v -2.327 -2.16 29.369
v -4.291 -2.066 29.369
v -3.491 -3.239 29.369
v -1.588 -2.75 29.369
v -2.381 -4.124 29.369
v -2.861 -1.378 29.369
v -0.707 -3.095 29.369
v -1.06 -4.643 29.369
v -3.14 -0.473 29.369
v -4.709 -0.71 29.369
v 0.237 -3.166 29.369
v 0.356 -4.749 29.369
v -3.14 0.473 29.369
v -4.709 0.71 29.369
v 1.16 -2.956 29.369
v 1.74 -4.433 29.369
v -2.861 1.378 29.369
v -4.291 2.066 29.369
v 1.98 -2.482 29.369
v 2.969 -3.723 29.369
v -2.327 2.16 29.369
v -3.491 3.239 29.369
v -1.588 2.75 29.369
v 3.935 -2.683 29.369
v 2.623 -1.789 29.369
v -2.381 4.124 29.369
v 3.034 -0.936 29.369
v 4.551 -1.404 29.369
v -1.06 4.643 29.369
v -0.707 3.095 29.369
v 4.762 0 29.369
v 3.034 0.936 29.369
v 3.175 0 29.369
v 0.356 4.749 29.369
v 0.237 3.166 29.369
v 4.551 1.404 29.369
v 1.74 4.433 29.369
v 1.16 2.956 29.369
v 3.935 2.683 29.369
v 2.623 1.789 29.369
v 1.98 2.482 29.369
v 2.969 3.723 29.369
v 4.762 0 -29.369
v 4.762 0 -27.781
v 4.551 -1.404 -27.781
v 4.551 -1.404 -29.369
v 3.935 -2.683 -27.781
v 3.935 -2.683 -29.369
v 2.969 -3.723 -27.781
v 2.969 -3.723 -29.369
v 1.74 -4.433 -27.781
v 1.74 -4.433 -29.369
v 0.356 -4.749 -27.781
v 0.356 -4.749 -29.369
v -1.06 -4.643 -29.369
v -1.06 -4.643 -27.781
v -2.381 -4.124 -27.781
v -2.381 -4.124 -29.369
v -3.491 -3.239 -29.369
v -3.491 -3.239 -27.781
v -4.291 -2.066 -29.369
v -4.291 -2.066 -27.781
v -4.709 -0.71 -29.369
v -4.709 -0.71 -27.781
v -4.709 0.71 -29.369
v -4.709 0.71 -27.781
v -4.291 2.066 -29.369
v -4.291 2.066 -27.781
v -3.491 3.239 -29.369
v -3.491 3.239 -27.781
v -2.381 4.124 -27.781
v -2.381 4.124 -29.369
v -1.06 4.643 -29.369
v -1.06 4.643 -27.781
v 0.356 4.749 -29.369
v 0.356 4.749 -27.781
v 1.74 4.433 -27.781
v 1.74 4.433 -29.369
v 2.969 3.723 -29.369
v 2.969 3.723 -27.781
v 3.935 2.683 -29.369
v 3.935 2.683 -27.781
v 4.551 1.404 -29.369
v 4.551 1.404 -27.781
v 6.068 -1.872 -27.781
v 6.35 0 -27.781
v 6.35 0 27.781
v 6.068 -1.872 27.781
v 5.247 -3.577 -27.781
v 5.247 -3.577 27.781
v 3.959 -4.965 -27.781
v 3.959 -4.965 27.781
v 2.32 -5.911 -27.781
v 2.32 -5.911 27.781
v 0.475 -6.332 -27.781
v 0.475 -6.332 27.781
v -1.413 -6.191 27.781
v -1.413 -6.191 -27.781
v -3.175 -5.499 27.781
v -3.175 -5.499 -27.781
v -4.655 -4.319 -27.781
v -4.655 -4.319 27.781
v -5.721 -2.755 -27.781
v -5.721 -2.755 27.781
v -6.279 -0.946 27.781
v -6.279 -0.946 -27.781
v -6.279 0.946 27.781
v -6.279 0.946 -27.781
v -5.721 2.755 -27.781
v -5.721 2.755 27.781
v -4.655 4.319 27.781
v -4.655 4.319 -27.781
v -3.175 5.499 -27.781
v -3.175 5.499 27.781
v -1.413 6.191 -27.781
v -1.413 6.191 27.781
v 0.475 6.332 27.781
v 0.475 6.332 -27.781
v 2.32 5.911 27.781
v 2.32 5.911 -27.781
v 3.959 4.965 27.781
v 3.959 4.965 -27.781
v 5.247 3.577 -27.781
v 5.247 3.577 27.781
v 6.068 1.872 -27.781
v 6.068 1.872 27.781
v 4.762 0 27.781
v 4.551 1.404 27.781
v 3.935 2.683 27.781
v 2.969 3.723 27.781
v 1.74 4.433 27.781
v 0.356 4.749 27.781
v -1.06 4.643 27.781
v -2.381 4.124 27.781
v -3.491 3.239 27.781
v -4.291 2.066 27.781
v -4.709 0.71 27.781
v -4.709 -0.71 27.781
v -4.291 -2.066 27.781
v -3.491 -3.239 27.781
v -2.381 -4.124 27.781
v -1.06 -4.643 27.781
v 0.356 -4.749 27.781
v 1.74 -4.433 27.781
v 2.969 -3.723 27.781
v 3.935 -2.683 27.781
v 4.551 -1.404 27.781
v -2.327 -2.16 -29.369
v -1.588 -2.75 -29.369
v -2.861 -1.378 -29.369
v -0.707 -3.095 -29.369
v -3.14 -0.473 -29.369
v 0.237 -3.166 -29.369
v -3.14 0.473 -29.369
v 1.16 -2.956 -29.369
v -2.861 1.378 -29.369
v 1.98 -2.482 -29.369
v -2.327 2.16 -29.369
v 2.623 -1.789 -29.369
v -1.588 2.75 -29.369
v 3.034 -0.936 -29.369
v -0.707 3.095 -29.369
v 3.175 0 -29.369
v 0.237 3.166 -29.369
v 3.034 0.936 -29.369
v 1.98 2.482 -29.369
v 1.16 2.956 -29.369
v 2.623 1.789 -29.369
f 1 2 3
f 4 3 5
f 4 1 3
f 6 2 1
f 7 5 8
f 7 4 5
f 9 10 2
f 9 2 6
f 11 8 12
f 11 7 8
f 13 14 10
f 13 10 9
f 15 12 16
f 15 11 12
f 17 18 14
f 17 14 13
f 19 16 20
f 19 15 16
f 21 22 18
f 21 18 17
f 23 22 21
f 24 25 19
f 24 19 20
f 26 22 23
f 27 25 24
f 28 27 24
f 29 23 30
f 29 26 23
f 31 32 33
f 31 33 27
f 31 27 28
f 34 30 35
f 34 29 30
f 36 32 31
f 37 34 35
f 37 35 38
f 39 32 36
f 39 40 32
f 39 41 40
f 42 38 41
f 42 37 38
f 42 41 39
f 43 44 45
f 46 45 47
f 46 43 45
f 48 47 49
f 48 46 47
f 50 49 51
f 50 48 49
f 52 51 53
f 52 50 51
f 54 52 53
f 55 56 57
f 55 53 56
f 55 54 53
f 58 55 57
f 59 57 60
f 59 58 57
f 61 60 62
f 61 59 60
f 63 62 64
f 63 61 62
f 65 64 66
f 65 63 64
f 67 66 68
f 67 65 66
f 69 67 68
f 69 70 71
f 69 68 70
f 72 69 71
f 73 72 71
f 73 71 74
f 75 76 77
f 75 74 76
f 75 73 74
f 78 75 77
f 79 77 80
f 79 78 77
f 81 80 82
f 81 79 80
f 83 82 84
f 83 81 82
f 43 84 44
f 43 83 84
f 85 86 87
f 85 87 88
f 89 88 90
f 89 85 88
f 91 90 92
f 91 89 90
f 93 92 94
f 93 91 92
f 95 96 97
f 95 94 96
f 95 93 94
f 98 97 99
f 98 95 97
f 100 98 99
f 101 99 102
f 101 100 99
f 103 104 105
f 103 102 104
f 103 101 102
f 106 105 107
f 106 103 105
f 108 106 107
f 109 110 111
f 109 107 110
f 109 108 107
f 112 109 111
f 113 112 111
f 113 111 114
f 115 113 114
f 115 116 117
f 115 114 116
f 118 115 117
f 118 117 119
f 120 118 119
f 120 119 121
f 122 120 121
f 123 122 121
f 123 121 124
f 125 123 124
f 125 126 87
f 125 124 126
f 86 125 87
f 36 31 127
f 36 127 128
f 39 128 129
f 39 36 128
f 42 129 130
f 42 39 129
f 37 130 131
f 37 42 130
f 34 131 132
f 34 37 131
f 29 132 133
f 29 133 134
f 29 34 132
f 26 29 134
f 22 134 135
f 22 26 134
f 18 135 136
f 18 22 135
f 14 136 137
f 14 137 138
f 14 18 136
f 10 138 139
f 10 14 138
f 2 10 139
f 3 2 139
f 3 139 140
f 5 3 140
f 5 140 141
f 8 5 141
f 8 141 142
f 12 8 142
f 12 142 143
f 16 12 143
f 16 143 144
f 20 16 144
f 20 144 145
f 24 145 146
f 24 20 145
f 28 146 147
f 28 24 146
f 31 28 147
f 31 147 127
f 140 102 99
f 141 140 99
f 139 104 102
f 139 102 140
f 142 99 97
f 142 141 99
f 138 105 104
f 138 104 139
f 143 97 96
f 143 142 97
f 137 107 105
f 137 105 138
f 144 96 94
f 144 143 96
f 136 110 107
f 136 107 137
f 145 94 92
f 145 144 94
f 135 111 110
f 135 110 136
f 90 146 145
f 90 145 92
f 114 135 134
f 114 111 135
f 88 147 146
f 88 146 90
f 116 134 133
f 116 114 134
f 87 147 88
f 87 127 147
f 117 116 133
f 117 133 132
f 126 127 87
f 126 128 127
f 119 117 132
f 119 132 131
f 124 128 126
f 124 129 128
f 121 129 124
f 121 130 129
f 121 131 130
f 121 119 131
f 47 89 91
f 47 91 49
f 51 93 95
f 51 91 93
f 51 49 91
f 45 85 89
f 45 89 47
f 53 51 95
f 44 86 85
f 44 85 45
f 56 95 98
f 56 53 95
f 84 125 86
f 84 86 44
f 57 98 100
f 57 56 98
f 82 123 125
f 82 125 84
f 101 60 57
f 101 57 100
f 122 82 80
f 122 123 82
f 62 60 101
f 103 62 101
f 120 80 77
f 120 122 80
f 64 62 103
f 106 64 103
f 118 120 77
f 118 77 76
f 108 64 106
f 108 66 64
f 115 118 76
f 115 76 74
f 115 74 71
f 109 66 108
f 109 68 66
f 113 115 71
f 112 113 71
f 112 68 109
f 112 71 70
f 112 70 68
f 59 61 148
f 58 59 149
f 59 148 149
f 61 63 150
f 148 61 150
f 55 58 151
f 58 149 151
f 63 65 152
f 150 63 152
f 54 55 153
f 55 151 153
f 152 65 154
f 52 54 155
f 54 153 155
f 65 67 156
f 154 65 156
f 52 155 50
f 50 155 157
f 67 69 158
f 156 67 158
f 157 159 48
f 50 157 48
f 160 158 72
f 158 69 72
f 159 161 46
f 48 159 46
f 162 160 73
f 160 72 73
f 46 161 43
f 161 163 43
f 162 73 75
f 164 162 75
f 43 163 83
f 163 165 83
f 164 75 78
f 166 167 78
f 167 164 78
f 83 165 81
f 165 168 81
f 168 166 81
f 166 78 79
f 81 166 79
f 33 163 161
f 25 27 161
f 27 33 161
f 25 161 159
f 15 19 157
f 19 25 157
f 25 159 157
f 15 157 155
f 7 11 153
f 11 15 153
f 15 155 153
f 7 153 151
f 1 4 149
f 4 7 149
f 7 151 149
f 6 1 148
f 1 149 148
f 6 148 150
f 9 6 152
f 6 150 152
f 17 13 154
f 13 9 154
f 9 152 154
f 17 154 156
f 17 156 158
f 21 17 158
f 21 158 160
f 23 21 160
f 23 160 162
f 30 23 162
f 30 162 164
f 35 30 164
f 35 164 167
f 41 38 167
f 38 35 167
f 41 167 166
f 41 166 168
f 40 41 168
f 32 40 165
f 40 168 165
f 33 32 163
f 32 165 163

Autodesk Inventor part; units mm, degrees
ref_plane "YZ Plane" through (0, 0, 0) normal (1, 0, 0) x (0, 1, 0)
ref_plane "XZ Plane" through (0, 0, 0) normal (0, 1, 0) x (-1, 0, 0)
ref_plane "XY Plane" through (0, 0, 0) normal (0, 0, 1) x (1, 0, 0)
sketch "Sketch1" plane through (0, 0, 0) normal (0, 0, 1) x (1, 0, 0)
  circle A0 centre (0, 0) radius 6.35
  circle A1 centre (0, 0) radius 3.175
  dimension "d0" = 12.7
  dimension "d13" = 3.175
extrude "Base" add sketch "Sketch1" along normal mid plane 58.7375
sketch "Sketch4" plane through (0, 0, 29.3688) normal (0, 0, 1) x (1, 0, 0)
  circle A0 centre (0, 0) radius 6.35 projected
  circle A1 centre (0, 0) radius 4.7625
  dimension "d16" = 9.525
extrude "Extrusion4" cut sketch "Sketch4" against normal blind 1.5875
mirror "Mirror2" about plane through (0, 0, 0) normal (0, 0, 1) of "Extrusion4"
properties part number "gearbox_standoff" material "Aluminum-6061"
